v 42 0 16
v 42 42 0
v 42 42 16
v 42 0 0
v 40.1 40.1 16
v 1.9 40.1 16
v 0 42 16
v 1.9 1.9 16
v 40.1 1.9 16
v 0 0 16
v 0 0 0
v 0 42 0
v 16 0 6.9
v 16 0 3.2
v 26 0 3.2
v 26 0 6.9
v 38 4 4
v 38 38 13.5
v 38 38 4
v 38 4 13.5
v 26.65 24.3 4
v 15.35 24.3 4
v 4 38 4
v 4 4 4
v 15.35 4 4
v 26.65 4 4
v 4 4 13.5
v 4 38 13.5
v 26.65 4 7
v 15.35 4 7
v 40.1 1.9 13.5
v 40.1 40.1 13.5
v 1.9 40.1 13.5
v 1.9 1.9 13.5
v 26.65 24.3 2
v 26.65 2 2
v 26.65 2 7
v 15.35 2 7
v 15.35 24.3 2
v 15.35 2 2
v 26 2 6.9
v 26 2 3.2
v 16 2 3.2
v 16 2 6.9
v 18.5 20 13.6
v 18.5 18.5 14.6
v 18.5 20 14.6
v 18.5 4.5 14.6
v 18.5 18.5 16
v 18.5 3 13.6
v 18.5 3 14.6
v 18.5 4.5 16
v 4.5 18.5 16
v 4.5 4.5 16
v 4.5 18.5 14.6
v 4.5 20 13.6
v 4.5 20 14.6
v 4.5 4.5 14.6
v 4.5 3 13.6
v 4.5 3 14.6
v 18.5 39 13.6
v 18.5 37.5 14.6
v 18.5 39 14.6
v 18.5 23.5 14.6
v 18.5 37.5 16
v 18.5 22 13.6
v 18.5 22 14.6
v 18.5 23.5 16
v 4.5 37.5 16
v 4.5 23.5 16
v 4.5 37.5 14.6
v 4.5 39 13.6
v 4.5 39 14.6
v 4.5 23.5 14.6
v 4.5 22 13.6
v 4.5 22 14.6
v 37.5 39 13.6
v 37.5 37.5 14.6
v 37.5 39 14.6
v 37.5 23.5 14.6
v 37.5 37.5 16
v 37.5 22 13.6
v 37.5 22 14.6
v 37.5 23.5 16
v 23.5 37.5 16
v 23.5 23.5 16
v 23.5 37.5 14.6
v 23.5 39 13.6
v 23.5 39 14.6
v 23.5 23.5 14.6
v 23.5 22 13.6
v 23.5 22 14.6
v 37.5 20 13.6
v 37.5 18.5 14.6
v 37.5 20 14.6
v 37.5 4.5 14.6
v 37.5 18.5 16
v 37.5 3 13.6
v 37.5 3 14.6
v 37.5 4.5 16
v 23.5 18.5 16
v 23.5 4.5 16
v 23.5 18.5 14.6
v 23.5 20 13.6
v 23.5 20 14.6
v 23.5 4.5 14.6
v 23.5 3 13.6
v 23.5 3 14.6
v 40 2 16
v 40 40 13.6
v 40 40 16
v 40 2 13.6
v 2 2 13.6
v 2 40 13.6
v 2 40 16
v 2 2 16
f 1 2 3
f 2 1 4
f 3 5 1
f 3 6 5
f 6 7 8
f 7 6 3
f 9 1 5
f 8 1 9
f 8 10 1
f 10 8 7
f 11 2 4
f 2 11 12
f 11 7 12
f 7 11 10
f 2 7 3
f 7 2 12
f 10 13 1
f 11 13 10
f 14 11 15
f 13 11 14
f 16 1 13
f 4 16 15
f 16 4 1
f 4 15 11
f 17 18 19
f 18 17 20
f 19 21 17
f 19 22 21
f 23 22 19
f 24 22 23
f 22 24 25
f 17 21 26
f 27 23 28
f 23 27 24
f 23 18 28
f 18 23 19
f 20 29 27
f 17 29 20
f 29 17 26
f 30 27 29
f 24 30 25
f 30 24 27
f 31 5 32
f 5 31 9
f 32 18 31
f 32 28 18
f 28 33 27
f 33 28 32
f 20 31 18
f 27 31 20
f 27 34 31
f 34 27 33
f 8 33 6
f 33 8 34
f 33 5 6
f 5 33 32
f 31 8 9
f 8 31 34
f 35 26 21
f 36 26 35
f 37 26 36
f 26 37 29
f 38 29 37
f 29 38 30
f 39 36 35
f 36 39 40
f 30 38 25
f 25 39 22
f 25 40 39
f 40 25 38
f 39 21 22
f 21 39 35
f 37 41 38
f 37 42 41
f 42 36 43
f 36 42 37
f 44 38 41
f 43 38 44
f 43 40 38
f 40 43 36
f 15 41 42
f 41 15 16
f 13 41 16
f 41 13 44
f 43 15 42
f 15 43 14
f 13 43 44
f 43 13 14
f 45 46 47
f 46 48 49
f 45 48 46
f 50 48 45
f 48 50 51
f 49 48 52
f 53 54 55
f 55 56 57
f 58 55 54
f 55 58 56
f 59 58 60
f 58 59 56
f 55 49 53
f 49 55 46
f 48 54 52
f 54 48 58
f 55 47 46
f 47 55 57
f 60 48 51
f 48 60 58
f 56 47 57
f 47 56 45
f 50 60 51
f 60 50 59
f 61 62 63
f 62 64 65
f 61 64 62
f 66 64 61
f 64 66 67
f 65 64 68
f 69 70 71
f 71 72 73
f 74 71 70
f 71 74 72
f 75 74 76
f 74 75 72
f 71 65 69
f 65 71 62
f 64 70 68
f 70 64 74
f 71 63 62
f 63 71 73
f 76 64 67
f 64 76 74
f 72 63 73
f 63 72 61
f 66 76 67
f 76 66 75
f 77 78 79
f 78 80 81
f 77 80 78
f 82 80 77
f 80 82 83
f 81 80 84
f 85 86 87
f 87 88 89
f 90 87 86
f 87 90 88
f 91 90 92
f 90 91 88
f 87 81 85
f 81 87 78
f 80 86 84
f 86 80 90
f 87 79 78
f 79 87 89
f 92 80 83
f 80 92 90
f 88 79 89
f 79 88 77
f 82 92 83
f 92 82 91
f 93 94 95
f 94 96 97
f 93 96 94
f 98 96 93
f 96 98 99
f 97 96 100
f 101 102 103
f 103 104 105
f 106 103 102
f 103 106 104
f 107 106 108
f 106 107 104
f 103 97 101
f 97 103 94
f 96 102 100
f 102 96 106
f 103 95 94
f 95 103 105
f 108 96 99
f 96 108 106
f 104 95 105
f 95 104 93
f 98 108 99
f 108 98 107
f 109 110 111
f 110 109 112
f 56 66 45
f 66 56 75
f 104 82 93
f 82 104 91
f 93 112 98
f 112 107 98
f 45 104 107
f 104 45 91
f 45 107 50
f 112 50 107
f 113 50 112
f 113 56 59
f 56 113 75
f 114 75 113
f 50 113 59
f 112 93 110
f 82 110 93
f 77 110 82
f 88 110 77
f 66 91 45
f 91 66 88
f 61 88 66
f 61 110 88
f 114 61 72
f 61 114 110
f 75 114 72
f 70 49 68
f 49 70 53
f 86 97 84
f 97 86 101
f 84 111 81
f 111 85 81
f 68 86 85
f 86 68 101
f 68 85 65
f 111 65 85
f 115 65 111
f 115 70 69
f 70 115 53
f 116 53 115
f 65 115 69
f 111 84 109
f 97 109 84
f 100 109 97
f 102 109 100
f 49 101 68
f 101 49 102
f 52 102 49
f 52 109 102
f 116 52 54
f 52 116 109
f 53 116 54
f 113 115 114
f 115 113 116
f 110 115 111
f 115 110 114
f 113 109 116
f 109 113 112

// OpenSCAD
epsilon = 0.1;

module mx_cutout(){  // origin at center, bottom view
    translate([-7,-7,-1]){
        union(){
            cube([14,14,5]);
            translate([0,-1.5,1+1.4]){
                cube([14,14+3,5]);
            }
        }
    }
}

module top_plate(){
    difference(){
        translate([-19,-19,0])
            cube([38,38,2.4]);
        translate([-9.5,-9.5,0])
            mx_cutout();
        translate([-9.5,+9.5,0])
            mx_cutout();
        translate([+9.5,+9.5,0])
            mx_cutout();
        translate([+9.5,-9.5,0])
            mx_cutout();
    }
}


module body(){
    difference(){
        cube([42,42,16]);  // main body
        translate([4,4,4])  // large cutout
            cube([34,34,16]);
        translate([2-epsilon,2-epsilon,16-2.4-epsilon])  // lip
            cube([38+2*epsilon,38+2*epsilon, 6]);
        translate([42/2 - 11.3/2, 2, 2])  // PCB
            cube([11.3, 22.3, 5]);
        translate([42/2 - 10/2, -1, 2+1.2])  // USB hole
            cube([10,6,3.7]);
    }
}



body();
translate([19+2, 19+2, 16]) scale([1,1,-1]) top_plate();

// body();
// top_plate();    
        
